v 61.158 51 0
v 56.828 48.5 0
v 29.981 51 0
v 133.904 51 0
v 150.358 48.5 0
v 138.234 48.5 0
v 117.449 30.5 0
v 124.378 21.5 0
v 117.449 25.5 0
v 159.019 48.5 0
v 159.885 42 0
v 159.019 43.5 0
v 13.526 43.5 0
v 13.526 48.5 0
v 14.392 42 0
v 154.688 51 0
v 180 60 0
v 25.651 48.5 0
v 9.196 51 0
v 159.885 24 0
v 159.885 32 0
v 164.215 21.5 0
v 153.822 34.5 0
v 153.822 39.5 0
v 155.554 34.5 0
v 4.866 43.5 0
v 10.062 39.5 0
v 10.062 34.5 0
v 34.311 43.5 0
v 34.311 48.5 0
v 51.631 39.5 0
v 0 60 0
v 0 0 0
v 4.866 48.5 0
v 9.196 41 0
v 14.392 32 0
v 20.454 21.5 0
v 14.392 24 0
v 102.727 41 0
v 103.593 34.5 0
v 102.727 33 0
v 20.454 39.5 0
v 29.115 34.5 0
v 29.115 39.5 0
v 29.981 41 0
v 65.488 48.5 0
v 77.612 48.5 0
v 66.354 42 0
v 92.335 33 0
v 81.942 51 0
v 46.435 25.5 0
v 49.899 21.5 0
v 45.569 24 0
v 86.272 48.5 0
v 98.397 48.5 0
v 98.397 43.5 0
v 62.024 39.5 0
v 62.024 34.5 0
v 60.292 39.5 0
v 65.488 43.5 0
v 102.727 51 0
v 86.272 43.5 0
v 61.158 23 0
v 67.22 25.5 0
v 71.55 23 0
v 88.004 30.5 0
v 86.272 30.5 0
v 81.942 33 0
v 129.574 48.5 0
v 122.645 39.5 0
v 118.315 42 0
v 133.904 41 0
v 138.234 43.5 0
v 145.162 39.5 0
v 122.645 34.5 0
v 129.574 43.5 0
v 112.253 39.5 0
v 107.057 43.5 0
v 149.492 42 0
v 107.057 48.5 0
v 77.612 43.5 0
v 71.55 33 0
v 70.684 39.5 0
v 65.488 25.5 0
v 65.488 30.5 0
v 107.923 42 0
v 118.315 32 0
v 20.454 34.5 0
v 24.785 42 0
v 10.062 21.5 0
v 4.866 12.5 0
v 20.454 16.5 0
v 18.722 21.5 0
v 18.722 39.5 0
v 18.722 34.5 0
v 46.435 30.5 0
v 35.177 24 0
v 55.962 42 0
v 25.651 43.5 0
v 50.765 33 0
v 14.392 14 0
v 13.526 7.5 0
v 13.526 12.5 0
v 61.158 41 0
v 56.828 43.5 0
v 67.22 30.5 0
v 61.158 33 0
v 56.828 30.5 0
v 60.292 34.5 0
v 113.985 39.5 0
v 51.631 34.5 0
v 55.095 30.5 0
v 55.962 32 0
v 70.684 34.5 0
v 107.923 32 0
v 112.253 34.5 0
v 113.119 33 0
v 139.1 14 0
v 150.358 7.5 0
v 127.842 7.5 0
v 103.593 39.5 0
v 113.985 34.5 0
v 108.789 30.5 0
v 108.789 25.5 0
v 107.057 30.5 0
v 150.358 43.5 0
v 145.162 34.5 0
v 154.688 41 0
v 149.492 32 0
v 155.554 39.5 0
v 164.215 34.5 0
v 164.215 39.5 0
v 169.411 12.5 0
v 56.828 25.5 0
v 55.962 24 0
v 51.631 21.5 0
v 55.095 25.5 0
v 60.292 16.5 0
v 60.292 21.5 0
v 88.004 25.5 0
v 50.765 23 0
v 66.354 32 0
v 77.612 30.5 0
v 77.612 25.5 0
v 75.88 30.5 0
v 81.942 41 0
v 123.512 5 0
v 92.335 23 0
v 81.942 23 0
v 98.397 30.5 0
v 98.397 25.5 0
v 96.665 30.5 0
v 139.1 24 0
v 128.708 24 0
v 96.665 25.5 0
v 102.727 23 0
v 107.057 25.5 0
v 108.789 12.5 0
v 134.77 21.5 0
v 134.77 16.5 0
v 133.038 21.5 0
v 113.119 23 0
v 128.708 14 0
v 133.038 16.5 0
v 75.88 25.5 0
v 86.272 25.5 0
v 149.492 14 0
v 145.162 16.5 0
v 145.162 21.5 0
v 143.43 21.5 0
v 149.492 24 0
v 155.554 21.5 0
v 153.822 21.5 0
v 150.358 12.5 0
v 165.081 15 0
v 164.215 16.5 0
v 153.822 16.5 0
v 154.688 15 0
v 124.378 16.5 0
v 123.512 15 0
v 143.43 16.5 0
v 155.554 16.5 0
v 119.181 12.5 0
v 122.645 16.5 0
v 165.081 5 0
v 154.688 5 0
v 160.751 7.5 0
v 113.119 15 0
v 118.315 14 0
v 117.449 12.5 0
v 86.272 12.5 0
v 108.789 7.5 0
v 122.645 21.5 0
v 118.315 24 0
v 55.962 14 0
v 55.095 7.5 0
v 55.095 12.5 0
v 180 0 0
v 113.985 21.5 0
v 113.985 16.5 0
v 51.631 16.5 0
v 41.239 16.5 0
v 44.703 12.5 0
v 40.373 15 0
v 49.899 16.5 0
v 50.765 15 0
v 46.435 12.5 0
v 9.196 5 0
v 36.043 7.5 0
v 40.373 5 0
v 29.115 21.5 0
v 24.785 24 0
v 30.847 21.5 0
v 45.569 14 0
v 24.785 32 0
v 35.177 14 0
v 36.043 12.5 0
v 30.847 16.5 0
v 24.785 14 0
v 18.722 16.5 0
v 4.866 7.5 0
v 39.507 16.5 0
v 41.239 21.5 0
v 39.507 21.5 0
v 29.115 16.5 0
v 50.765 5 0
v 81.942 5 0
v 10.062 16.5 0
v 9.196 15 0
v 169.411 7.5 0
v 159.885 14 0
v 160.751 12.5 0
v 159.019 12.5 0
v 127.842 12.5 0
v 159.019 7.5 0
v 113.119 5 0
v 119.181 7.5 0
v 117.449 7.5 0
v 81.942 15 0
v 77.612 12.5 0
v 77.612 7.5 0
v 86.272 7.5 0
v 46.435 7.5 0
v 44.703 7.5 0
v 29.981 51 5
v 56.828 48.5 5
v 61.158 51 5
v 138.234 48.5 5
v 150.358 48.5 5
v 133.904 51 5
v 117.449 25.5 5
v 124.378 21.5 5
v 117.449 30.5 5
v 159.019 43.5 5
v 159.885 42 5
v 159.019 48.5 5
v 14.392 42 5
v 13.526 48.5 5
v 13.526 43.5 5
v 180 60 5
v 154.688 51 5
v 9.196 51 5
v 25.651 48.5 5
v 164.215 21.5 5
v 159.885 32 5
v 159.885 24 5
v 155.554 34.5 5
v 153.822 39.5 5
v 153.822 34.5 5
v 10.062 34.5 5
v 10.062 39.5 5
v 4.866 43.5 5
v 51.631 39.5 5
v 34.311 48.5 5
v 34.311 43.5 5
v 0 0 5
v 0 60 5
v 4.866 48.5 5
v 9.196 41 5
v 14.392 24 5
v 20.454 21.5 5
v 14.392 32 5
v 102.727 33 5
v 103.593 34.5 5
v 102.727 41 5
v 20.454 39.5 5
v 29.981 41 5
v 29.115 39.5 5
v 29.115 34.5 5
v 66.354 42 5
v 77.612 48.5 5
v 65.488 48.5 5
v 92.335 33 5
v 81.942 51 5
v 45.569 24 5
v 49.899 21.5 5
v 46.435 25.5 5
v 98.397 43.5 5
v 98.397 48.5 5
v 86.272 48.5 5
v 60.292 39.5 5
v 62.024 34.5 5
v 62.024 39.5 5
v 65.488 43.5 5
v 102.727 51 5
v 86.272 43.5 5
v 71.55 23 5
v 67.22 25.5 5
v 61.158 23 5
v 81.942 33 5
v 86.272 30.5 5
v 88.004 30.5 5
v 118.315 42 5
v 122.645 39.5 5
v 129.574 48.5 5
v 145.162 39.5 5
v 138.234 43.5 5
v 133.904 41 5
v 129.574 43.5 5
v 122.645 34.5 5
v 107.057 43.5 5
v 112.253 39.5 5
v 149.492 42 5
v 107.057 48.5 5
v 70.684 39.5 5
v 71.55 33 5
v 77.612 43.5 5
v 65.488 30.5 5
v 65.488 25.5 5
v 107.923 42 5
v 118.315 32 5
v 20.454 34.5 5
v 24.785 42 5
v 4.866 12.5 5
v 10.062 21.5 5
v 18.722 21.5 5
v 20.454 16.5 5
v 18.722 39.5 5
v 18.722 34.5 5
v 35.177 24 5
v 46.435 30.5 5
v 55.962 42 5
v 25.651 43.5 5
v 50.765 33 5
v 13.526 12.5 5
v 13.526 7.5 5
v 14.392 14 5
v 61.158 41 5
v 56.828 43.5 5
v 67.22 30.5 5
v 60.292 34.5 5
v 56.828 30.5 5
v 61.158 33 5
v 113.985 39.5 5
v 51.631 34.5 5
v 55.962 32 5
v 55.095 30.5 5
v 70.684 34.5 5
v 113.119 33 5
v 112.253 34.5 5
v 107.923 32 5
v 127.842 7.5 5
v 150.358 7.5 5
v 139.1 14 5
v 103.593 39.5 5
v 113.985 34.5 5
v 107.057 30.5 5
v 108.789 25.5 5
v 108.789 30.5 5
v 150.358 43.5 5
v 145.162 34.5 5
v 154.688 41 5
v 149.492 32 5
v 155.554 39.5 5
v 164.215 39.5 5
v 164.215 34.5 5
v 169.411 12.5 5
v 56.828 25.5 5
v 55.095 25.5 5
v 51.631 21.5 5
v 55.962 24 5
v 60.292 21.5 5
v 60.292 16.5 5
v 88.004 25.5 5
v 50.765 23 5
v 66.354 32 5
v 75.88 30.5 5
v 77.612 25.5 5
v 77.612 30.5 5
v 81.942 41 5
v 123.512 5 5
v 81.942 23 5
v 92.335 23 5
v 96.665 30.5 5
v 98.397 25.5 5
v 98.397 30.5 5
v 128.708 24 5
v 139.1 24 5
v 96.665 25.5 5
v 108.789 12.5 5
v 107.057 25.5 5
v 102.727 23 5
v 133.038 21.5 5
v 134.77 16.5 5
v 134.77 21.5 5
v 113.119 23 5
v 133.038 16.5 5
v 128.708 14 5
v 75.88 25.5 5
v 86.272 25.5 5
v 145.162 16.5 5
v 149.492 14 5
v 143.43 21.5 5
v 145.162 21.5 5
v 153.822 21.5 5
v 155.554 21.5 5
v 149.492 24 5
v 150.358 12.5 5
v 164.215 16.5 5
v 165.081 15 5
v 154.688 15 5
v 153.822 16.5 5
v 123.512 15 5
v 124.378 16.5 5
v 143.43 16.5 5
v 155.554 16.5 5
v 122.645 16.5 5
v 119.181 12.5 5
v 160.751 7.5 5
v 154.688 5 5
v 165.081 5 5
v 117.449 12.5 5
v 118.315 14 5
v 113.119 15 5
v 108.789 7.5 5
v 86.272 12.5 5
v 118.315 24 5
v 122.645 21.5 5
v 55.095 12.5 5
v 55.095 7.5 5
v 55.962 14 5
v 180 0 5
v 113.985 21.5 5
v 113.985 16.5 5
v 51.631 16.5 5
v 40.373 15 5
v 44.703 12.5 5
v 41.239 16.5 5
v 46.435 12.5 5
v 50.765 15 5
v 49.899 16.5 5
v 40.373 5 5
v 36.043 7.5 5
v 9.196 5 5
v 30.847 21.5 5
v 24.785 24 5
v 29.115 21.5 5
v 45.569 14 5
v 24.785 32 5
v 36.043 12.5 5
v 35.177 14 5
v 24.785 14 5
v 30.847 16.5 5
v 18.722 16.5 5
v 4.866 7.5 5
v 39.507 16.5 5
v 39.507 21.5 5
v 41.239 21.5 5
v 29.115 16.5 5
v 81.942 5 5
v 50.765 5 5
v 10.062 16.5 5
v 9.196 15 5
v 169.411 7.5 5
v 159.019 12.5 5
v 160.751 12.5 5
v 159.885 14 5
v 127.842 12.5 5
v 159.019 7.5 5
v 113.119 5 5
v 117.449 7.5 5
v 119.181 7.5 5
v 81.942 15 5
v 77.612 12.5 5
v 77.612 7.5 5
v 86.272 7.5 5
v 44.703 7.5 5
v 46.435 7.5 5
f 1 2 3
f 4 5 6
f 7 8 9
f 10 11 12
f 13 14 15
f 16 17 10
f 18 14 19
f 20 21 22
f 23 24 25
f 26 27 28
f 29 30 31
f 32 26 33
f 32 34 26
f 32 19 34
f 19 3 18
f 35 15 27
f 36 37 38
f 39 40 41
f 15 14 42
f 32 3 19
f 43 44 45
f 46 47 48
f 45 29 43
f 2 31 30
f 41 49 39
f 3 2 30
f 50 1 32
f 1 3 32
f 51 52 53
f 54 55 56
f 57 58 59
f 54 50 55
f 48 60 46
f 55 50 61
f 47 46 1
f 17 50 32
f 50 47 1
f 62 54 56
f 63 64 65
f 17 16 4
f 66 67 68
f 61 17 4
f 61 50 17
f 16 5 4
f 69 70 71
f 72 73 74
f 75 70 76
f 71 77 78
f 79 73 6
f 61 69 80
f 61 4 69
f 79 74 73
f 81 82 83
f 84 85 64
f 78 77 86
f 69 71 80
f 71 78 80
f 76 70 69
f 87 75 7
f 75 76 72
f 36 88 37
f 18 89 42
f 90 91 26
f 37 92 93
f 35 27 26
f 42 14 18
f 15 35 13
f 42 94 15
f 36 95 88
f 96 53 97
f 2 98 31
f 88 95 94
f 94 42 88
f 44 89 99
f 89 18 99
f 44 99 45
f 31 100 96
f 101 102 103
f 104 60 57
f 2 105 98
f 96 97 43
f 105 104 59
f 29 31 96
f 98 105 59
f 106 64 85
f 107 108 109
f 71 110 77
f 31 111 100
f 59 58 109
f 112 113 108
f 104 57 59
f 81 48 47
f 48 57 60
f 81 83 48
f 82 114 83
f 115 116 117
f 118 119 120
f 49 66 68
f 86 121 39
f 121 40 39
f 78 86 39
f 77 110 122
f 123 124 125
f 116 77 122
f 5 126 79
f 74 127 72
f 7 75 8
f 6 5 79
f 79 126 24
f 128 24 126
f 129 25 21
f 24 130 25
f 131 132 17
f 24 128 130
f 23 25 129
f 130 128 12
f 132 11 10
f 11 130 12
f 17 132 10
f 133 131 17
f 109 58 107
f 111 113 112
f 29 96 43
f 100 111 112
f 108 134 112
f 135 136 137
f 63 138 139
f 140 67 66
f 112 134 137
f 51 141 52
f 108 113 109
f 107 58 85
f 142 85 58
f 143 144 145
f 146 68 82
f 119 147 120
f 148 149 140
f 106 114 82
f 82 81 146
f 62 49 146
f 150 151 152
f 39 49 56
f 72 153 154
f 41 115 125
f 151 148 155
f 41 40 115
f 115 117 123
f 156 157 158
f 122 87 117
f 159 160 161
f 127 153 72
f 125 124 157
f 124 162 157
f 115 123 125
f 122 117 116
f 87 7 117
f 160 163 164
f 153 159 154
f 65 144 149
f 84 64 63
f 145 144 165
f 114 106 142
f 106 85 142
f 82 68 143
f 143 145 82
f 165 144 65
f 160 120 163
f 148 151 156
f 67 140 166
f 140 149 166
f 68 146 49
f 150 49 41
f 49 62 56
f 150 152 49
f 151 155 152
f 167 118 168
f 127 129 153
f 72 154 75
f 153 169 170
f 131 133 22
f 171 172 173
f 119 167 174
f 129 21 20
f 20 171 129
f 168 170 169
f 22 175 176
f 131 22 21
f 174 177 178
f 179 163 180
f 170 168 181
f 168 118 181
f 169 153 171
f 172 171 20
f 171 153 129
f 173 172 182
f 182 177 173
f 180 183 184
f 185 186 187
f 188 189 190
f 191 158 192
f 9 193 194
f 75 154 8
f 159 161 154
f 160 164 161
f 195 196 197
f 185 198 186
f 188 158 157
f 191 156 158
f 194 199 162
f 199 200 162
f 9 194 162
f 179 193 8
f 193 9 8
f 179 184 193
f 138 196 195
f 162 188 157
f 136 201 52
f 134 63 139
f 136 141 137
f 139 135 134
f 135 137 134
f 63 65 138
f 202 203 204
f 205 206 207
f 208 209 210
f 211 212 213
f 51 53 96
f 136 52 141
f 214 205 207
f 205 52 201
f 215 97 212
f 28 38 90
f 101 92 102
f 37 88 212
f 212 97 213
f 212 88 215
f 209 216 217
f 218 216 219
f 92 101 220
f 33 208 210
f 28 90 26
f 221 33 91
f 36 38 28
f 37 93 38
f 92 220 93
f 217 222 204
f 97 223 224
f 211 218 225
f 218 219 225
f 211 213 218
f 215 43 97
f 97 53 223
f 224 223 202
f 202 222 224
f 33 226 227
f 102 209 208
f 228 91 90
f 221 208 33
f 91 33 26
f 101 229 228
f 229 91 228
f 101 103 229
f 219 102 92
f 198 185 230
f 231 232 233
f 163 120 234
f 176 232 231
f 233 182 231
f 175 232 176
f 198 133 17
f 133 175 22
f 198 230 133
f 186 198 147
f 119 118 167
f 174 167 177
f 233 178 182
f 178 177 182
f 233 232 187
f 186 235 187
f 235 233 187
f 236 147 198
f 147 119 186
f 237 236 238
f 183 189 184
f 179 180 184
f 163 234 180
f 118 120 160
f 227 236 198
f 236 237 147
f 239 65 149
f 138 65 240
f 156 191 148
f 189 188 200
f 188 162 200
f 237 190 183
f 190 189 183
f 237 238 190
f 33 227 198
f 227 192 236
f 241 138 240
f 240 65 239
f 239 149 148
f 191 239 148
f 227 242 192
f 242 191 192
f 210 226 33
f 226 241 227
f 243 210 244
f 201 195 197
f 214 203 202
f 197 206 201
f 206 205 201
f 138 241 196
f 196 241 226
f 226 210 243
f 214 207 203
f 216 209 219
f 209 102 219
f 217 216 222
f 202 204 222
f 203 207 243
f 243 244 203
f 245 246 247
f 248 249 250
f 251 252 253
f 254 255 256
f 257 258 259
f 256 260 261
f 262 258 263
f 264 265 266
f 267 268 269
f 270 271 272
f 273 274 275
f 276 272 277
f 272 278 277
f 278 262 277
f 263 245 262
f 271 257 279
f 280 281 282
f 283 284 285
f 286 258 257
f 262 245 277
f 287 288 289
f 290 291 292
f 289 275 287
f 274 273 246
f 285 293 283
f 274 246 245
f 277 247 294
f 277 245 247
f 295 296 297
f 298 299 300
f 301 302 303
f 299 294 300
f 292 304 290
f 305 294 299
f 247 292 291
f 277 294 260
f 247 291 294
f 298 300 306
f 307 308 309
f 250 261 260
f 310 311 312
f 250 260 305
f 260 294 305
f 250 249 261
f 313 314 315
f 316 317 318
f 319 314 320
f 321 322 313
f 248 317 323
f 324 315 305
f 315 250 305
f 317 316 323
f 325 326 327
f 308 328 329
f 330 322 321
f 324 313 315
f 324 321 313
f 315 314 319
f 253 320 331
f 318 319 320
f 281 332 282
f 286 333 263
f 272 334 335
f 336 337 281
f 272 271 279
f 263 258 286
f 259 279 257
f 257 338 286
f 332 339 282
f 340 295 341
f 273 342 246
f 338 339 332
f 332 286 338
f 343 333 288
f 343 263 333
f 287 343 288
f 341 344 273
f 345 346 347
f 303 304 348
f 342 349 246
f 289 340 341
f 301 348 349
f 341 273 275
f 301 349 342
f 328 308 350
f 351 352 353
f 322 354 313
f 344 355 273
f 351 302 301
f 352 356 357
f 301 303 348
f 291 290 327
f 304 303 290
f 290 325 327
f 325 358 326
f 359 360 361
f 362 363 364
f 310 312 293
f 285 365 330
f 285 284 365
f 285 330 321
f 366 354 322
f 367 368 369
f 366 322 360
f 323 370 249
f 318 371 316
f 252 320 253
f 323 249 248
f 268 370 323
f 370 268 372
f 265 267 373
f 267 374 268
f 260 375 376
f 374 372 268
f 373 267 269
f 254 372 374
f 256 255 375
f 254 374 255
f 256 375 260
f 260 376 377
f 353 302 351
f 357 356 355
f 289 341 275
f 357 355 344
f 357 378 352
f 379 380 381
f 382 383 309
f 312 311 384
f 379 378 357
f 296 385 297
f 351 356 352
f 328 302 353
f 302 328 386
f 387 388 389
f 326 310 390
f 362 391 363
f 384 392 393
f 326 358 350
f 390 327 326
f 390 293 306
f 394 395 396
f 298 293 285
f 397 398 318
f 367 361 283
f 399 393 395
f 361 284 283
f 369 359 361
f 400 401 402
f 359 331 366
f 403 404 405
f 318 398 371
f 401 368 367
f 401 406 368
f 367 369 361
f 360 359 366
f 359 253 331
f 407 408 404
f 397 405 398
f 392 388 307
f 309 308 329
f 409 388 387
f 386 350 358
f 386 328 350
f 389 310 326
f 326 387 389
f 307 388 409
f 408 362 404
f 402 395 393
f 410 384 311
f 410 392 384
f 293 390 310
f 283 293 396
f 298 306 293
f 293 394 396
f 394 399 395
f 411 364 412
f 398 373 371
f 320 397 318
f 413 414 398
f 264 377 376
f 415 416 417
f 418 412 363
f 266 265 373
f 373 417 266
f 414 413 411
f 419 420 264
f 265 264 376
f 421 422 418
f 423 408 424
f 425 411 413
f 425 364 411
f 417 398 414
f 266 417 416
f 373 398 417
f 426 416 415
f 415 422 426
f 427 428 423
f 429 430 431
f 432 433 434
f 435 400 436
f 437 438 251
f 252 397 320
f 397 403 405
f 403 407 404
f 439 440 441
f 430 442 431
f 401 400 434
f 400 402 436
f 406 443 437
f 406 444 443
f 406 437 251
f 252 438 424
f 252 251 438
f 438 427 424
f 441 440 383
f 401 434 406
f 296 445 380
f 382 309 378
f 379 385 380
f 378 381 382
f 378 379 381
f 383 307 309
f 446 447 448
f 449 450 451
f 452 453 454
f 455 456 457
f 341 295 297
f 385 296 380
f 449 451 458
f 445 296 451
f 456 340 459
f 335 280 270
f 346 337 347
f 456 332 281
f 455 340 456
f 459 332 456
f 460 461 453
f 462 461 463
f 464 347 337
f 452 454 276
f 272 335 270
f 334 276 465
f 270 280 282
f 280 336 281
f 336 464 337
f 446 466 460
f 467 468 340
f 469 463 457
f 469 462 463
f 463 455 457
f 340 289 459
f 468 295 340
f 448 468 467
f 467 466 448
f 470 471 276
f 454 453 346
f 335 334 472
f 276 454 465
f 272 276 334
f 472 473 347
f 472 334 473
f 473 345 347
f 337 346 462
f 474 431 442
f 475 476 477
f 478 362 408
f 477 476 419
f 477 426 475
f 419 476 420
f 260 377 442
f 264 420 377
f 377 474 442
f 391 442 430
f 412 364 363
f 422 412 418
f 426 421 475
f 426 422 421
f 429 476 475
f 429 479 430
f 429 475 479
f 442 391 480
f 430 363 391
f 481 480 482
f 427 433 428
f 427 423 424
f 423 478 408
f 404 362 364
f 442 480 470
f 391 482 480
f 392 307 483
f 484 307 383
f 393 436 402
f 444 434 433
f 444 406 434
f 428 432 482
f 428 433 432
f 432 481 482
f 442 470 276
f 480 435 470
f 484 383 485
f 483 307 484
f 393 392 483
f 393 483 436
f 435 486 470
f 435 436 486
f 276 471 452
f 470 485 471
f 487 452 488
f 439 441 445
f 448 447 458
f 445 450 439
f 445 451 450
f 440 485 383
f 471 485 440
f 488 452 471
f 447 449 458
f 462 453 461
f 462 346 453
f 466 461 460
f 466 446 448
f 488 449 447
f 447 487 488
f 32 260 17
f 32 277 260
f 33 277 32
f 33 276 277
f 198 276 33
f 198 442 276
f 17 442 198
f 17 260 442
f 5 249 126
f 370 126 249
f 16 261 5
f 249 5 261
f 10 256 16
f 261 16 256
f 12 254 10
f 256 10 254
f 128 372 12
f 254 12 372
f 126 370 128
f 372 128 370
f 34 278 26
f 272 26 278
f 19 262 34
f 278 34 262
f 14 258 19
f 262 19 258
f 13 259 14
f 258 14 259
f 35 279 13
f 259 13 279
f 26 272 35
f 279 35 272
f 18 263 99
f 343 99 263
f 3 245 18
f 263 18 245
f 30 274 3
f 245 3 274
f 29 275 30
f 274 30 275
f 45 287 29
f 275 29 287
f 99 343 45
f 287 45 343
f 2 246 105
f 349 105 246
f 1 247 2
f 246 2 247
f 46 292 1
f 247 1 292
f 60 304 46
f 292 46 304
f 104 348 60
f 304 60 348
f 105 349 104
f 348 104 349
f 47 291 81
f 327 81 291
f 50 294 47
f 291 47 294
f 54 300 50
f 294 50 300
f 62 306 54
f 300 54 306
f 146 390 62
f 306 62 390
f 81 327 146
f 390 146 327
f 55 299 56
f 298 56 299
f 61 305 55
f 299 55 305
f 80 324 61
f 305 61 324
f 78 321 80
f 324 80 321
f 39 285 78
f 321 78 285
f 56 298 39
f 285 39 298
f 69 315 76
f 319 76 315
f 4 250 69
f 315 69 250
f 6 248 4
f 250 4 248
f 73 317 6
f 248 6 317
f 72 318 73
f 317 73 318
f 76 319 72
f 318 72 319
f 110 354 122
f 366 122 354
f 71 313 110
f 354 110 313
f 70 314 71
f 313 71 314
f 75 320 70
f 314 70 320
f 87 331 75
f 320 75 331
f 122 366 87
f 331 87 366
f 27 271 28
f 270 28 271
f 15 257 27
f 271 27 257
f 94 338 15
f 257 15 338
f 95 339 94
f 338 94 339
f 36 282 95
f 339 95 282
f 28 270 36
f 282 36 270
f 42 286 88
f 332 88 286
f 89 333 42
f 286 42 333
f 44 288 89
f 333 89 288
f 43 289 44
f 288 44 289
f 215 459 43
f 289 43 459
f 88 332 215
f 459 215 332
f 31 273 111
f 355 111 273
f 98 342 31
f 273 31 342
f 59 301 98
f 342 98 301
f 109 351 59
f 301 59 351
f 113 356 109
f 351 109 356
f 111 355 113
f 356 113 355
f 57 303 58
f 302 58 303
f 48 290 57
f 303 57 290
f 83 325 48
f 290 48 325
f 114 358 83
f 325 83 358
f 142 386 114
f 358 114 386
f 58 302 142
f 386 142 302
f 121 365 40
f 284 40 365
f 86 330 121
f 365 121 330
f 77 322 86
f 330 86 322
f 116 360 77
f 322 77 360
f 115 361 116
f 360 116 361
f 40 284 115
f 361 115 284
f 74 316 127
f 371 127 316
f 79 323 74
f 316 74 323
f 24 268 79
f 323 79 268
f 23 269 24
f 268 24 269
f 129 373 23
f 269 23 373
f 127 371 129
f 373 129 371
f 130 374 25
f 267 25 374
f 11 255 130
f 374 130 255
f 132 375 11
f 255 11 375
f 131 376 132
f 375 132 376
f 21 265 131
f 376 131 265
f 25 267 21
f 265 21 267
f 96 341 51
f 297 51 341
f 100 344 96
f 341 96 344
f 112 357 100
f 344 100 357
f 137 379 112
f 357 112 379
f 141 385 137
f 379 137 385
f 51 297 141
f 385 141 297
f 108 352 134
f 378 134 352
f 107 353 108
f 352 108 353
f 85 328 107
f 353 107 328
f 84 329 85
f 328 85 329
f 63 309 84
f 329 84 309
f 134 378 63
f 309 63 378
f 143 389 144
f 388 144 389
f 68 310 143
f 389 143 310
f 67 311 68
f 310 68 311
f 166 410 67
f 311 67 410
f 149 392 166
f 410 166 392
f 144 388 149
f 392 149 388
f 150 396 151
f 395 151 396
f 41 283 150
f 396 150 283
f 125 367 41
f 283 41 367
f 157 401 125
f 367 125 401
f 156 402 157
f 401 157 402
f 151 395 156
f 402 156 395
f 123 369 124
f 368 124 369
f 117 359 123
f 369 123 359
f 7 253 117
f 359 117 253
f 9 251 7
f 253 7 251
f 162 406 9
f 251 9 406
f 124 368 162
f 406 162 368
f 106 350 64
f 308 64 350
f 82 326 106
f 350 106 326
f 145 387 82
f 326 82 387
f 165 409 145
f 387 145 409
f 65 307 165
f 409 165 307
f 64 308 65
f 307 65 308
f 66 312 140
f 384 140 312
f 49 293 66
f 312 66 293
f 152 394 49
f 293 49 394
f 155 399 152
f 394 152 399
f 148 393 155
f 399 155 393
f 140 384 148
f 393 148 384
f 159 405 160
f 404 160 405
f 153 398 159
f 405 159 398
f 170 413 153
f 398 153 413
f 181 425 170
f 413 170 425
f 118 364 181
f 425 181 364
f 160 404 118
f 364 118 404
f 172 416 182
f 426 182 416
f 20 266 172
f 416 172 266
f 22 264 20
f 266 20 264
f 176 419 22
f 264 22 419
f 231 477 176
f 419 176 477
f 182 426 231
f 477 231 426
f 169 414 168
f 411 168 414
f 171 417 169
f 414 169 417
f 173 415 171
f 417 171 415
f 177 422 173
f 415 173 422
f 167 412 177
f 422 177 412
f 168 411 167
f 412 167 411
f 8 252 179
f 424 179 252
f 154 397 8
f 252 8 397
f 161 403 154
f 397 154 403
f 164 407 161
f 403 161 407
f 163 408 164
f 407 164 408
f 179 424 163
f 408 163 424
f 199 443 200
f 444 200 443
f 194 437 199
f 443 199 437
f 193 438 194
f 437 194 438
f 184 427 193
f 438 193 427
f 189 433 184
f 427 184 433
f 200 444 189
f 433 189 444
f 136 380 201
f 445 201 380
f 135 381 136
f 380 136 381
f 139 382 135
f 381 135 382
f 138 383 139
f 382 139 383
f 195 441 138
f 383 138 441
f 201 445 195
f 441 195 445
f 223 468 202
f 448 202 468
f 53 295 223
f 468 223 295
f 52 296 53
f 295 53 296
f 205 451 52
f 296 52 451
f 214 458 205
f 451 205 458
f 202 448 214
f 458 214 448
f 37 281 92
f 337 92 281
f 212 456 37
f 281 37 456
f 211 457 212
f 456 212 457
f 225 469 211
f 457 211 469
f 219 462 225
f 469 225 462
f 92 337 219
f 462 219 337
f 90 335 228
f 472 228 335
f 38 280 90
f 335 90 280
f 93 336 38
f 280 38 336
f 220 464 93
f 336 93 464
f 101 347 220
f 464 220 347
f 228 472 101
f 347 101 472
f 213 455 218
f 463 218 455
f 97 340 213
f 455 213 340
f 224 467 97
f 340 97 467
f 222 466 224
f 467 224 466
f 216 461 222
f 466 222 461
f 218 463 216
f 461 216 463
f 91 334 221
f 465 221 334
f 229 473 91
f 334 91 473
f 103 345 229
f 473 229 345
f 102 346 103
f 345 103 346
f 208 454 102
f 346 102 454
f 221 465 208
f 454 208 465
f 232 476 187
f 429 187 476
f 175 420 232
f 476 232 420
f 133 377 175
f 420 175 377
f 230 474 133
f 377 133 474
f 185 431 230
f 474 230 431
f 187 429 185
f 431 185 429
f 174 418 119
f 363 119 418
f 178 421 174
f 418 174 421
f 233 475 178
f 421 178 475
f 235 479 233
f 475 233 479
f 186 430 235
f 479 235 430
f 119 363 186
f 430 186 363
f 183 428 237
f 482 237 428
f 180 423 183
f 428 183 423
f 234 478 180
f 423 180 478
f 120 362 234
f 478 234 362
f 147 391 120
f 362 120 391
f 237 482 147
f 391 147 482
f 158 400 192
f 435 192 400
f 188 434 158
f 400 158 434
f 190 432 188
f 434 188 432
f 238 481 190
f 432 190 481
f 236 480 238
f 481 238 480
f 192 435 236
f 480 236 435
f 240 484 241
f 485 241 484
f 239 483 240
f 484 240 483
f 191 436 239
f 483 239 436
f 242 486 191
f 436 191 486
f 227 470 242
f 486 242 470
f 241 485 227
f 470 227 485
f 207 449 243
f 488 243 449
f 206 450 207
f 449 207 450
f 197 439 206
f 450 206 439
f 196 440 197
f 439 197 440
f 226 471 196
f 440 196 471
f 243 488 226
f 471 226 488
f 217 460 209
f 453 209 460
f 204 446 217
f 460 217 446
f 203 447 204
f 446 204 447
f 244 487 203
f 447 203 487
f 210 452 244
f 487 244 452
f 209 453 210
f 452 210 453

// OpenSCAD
// Digital Camo Spray Paint Stencil - Hexagons
// 180 x 60 x 5 mm
// Pointy-top hex grid. Each cutout is smaller than its cell so a thin
// web of material remains between every neighbor.

// ===== Parameters =====
length      = 180;   // X
height      = 60;    // Y
thickness   = 5;     // Z
hex_size    = 6;     // cell circumradius (center to vertex)
cutout_size = 5;     // cutout circumradius (smaller leaves a thicker web)
frame       = 4;     // outer frame on all sides
fill_pct    = 45;    // 0..100, percent of hex cells that get cut

// ===== Computed (pointy-top geometry) =====
hex_w  = sqrt(3) * hex_size;   // flat-to-flat width
hex_h  = 2 * hex_size;         // point-to-point height
h_step = hex_w;                // horizontal center-to-center step
v_step = 1.5 * hex_size;       // vertical center-to-center step

// Number of cells that fit. Iterate slightly past and let the bounds
// check filter out any hex whose body would cross the frame.
cols = floor((length - 2 * frame - hex_w) / h_step) + 2;
rows = floor((height - 2 * frame - hex_h) / v_step) + 1;

// ===== Main =====
linear_extrude(height = thickness)
    difference() {
        square([length, height]);
        for (r = [0 : rows - 1])
            for (c = [0 : cols - 1]) {
                x_off = (r % 2 == 1) ? h_step / 2 : 0;
                cx = frame + hex_w / 2 + c * h_step + x_off;
                cy = frame + hex_size + r * v_step;
                // Only cut if the full hex fits inside the frame
                if (cx + hex_w / 2 <= length - frame
                    && cy + hex_size <= height - frame
                    && should_cut(c, r)) {
                    translate([cx, cy])
                        rotate(30)
                            circle(r = cutout_size, $fn = 6);
                }
            }
    }

// ===== Deterministic pseudo-random selector =====
function should_cut(c, r) =
    ((c * 73 + r * 31 + c * r * 17 + 11) % 100) < fill_pct;
